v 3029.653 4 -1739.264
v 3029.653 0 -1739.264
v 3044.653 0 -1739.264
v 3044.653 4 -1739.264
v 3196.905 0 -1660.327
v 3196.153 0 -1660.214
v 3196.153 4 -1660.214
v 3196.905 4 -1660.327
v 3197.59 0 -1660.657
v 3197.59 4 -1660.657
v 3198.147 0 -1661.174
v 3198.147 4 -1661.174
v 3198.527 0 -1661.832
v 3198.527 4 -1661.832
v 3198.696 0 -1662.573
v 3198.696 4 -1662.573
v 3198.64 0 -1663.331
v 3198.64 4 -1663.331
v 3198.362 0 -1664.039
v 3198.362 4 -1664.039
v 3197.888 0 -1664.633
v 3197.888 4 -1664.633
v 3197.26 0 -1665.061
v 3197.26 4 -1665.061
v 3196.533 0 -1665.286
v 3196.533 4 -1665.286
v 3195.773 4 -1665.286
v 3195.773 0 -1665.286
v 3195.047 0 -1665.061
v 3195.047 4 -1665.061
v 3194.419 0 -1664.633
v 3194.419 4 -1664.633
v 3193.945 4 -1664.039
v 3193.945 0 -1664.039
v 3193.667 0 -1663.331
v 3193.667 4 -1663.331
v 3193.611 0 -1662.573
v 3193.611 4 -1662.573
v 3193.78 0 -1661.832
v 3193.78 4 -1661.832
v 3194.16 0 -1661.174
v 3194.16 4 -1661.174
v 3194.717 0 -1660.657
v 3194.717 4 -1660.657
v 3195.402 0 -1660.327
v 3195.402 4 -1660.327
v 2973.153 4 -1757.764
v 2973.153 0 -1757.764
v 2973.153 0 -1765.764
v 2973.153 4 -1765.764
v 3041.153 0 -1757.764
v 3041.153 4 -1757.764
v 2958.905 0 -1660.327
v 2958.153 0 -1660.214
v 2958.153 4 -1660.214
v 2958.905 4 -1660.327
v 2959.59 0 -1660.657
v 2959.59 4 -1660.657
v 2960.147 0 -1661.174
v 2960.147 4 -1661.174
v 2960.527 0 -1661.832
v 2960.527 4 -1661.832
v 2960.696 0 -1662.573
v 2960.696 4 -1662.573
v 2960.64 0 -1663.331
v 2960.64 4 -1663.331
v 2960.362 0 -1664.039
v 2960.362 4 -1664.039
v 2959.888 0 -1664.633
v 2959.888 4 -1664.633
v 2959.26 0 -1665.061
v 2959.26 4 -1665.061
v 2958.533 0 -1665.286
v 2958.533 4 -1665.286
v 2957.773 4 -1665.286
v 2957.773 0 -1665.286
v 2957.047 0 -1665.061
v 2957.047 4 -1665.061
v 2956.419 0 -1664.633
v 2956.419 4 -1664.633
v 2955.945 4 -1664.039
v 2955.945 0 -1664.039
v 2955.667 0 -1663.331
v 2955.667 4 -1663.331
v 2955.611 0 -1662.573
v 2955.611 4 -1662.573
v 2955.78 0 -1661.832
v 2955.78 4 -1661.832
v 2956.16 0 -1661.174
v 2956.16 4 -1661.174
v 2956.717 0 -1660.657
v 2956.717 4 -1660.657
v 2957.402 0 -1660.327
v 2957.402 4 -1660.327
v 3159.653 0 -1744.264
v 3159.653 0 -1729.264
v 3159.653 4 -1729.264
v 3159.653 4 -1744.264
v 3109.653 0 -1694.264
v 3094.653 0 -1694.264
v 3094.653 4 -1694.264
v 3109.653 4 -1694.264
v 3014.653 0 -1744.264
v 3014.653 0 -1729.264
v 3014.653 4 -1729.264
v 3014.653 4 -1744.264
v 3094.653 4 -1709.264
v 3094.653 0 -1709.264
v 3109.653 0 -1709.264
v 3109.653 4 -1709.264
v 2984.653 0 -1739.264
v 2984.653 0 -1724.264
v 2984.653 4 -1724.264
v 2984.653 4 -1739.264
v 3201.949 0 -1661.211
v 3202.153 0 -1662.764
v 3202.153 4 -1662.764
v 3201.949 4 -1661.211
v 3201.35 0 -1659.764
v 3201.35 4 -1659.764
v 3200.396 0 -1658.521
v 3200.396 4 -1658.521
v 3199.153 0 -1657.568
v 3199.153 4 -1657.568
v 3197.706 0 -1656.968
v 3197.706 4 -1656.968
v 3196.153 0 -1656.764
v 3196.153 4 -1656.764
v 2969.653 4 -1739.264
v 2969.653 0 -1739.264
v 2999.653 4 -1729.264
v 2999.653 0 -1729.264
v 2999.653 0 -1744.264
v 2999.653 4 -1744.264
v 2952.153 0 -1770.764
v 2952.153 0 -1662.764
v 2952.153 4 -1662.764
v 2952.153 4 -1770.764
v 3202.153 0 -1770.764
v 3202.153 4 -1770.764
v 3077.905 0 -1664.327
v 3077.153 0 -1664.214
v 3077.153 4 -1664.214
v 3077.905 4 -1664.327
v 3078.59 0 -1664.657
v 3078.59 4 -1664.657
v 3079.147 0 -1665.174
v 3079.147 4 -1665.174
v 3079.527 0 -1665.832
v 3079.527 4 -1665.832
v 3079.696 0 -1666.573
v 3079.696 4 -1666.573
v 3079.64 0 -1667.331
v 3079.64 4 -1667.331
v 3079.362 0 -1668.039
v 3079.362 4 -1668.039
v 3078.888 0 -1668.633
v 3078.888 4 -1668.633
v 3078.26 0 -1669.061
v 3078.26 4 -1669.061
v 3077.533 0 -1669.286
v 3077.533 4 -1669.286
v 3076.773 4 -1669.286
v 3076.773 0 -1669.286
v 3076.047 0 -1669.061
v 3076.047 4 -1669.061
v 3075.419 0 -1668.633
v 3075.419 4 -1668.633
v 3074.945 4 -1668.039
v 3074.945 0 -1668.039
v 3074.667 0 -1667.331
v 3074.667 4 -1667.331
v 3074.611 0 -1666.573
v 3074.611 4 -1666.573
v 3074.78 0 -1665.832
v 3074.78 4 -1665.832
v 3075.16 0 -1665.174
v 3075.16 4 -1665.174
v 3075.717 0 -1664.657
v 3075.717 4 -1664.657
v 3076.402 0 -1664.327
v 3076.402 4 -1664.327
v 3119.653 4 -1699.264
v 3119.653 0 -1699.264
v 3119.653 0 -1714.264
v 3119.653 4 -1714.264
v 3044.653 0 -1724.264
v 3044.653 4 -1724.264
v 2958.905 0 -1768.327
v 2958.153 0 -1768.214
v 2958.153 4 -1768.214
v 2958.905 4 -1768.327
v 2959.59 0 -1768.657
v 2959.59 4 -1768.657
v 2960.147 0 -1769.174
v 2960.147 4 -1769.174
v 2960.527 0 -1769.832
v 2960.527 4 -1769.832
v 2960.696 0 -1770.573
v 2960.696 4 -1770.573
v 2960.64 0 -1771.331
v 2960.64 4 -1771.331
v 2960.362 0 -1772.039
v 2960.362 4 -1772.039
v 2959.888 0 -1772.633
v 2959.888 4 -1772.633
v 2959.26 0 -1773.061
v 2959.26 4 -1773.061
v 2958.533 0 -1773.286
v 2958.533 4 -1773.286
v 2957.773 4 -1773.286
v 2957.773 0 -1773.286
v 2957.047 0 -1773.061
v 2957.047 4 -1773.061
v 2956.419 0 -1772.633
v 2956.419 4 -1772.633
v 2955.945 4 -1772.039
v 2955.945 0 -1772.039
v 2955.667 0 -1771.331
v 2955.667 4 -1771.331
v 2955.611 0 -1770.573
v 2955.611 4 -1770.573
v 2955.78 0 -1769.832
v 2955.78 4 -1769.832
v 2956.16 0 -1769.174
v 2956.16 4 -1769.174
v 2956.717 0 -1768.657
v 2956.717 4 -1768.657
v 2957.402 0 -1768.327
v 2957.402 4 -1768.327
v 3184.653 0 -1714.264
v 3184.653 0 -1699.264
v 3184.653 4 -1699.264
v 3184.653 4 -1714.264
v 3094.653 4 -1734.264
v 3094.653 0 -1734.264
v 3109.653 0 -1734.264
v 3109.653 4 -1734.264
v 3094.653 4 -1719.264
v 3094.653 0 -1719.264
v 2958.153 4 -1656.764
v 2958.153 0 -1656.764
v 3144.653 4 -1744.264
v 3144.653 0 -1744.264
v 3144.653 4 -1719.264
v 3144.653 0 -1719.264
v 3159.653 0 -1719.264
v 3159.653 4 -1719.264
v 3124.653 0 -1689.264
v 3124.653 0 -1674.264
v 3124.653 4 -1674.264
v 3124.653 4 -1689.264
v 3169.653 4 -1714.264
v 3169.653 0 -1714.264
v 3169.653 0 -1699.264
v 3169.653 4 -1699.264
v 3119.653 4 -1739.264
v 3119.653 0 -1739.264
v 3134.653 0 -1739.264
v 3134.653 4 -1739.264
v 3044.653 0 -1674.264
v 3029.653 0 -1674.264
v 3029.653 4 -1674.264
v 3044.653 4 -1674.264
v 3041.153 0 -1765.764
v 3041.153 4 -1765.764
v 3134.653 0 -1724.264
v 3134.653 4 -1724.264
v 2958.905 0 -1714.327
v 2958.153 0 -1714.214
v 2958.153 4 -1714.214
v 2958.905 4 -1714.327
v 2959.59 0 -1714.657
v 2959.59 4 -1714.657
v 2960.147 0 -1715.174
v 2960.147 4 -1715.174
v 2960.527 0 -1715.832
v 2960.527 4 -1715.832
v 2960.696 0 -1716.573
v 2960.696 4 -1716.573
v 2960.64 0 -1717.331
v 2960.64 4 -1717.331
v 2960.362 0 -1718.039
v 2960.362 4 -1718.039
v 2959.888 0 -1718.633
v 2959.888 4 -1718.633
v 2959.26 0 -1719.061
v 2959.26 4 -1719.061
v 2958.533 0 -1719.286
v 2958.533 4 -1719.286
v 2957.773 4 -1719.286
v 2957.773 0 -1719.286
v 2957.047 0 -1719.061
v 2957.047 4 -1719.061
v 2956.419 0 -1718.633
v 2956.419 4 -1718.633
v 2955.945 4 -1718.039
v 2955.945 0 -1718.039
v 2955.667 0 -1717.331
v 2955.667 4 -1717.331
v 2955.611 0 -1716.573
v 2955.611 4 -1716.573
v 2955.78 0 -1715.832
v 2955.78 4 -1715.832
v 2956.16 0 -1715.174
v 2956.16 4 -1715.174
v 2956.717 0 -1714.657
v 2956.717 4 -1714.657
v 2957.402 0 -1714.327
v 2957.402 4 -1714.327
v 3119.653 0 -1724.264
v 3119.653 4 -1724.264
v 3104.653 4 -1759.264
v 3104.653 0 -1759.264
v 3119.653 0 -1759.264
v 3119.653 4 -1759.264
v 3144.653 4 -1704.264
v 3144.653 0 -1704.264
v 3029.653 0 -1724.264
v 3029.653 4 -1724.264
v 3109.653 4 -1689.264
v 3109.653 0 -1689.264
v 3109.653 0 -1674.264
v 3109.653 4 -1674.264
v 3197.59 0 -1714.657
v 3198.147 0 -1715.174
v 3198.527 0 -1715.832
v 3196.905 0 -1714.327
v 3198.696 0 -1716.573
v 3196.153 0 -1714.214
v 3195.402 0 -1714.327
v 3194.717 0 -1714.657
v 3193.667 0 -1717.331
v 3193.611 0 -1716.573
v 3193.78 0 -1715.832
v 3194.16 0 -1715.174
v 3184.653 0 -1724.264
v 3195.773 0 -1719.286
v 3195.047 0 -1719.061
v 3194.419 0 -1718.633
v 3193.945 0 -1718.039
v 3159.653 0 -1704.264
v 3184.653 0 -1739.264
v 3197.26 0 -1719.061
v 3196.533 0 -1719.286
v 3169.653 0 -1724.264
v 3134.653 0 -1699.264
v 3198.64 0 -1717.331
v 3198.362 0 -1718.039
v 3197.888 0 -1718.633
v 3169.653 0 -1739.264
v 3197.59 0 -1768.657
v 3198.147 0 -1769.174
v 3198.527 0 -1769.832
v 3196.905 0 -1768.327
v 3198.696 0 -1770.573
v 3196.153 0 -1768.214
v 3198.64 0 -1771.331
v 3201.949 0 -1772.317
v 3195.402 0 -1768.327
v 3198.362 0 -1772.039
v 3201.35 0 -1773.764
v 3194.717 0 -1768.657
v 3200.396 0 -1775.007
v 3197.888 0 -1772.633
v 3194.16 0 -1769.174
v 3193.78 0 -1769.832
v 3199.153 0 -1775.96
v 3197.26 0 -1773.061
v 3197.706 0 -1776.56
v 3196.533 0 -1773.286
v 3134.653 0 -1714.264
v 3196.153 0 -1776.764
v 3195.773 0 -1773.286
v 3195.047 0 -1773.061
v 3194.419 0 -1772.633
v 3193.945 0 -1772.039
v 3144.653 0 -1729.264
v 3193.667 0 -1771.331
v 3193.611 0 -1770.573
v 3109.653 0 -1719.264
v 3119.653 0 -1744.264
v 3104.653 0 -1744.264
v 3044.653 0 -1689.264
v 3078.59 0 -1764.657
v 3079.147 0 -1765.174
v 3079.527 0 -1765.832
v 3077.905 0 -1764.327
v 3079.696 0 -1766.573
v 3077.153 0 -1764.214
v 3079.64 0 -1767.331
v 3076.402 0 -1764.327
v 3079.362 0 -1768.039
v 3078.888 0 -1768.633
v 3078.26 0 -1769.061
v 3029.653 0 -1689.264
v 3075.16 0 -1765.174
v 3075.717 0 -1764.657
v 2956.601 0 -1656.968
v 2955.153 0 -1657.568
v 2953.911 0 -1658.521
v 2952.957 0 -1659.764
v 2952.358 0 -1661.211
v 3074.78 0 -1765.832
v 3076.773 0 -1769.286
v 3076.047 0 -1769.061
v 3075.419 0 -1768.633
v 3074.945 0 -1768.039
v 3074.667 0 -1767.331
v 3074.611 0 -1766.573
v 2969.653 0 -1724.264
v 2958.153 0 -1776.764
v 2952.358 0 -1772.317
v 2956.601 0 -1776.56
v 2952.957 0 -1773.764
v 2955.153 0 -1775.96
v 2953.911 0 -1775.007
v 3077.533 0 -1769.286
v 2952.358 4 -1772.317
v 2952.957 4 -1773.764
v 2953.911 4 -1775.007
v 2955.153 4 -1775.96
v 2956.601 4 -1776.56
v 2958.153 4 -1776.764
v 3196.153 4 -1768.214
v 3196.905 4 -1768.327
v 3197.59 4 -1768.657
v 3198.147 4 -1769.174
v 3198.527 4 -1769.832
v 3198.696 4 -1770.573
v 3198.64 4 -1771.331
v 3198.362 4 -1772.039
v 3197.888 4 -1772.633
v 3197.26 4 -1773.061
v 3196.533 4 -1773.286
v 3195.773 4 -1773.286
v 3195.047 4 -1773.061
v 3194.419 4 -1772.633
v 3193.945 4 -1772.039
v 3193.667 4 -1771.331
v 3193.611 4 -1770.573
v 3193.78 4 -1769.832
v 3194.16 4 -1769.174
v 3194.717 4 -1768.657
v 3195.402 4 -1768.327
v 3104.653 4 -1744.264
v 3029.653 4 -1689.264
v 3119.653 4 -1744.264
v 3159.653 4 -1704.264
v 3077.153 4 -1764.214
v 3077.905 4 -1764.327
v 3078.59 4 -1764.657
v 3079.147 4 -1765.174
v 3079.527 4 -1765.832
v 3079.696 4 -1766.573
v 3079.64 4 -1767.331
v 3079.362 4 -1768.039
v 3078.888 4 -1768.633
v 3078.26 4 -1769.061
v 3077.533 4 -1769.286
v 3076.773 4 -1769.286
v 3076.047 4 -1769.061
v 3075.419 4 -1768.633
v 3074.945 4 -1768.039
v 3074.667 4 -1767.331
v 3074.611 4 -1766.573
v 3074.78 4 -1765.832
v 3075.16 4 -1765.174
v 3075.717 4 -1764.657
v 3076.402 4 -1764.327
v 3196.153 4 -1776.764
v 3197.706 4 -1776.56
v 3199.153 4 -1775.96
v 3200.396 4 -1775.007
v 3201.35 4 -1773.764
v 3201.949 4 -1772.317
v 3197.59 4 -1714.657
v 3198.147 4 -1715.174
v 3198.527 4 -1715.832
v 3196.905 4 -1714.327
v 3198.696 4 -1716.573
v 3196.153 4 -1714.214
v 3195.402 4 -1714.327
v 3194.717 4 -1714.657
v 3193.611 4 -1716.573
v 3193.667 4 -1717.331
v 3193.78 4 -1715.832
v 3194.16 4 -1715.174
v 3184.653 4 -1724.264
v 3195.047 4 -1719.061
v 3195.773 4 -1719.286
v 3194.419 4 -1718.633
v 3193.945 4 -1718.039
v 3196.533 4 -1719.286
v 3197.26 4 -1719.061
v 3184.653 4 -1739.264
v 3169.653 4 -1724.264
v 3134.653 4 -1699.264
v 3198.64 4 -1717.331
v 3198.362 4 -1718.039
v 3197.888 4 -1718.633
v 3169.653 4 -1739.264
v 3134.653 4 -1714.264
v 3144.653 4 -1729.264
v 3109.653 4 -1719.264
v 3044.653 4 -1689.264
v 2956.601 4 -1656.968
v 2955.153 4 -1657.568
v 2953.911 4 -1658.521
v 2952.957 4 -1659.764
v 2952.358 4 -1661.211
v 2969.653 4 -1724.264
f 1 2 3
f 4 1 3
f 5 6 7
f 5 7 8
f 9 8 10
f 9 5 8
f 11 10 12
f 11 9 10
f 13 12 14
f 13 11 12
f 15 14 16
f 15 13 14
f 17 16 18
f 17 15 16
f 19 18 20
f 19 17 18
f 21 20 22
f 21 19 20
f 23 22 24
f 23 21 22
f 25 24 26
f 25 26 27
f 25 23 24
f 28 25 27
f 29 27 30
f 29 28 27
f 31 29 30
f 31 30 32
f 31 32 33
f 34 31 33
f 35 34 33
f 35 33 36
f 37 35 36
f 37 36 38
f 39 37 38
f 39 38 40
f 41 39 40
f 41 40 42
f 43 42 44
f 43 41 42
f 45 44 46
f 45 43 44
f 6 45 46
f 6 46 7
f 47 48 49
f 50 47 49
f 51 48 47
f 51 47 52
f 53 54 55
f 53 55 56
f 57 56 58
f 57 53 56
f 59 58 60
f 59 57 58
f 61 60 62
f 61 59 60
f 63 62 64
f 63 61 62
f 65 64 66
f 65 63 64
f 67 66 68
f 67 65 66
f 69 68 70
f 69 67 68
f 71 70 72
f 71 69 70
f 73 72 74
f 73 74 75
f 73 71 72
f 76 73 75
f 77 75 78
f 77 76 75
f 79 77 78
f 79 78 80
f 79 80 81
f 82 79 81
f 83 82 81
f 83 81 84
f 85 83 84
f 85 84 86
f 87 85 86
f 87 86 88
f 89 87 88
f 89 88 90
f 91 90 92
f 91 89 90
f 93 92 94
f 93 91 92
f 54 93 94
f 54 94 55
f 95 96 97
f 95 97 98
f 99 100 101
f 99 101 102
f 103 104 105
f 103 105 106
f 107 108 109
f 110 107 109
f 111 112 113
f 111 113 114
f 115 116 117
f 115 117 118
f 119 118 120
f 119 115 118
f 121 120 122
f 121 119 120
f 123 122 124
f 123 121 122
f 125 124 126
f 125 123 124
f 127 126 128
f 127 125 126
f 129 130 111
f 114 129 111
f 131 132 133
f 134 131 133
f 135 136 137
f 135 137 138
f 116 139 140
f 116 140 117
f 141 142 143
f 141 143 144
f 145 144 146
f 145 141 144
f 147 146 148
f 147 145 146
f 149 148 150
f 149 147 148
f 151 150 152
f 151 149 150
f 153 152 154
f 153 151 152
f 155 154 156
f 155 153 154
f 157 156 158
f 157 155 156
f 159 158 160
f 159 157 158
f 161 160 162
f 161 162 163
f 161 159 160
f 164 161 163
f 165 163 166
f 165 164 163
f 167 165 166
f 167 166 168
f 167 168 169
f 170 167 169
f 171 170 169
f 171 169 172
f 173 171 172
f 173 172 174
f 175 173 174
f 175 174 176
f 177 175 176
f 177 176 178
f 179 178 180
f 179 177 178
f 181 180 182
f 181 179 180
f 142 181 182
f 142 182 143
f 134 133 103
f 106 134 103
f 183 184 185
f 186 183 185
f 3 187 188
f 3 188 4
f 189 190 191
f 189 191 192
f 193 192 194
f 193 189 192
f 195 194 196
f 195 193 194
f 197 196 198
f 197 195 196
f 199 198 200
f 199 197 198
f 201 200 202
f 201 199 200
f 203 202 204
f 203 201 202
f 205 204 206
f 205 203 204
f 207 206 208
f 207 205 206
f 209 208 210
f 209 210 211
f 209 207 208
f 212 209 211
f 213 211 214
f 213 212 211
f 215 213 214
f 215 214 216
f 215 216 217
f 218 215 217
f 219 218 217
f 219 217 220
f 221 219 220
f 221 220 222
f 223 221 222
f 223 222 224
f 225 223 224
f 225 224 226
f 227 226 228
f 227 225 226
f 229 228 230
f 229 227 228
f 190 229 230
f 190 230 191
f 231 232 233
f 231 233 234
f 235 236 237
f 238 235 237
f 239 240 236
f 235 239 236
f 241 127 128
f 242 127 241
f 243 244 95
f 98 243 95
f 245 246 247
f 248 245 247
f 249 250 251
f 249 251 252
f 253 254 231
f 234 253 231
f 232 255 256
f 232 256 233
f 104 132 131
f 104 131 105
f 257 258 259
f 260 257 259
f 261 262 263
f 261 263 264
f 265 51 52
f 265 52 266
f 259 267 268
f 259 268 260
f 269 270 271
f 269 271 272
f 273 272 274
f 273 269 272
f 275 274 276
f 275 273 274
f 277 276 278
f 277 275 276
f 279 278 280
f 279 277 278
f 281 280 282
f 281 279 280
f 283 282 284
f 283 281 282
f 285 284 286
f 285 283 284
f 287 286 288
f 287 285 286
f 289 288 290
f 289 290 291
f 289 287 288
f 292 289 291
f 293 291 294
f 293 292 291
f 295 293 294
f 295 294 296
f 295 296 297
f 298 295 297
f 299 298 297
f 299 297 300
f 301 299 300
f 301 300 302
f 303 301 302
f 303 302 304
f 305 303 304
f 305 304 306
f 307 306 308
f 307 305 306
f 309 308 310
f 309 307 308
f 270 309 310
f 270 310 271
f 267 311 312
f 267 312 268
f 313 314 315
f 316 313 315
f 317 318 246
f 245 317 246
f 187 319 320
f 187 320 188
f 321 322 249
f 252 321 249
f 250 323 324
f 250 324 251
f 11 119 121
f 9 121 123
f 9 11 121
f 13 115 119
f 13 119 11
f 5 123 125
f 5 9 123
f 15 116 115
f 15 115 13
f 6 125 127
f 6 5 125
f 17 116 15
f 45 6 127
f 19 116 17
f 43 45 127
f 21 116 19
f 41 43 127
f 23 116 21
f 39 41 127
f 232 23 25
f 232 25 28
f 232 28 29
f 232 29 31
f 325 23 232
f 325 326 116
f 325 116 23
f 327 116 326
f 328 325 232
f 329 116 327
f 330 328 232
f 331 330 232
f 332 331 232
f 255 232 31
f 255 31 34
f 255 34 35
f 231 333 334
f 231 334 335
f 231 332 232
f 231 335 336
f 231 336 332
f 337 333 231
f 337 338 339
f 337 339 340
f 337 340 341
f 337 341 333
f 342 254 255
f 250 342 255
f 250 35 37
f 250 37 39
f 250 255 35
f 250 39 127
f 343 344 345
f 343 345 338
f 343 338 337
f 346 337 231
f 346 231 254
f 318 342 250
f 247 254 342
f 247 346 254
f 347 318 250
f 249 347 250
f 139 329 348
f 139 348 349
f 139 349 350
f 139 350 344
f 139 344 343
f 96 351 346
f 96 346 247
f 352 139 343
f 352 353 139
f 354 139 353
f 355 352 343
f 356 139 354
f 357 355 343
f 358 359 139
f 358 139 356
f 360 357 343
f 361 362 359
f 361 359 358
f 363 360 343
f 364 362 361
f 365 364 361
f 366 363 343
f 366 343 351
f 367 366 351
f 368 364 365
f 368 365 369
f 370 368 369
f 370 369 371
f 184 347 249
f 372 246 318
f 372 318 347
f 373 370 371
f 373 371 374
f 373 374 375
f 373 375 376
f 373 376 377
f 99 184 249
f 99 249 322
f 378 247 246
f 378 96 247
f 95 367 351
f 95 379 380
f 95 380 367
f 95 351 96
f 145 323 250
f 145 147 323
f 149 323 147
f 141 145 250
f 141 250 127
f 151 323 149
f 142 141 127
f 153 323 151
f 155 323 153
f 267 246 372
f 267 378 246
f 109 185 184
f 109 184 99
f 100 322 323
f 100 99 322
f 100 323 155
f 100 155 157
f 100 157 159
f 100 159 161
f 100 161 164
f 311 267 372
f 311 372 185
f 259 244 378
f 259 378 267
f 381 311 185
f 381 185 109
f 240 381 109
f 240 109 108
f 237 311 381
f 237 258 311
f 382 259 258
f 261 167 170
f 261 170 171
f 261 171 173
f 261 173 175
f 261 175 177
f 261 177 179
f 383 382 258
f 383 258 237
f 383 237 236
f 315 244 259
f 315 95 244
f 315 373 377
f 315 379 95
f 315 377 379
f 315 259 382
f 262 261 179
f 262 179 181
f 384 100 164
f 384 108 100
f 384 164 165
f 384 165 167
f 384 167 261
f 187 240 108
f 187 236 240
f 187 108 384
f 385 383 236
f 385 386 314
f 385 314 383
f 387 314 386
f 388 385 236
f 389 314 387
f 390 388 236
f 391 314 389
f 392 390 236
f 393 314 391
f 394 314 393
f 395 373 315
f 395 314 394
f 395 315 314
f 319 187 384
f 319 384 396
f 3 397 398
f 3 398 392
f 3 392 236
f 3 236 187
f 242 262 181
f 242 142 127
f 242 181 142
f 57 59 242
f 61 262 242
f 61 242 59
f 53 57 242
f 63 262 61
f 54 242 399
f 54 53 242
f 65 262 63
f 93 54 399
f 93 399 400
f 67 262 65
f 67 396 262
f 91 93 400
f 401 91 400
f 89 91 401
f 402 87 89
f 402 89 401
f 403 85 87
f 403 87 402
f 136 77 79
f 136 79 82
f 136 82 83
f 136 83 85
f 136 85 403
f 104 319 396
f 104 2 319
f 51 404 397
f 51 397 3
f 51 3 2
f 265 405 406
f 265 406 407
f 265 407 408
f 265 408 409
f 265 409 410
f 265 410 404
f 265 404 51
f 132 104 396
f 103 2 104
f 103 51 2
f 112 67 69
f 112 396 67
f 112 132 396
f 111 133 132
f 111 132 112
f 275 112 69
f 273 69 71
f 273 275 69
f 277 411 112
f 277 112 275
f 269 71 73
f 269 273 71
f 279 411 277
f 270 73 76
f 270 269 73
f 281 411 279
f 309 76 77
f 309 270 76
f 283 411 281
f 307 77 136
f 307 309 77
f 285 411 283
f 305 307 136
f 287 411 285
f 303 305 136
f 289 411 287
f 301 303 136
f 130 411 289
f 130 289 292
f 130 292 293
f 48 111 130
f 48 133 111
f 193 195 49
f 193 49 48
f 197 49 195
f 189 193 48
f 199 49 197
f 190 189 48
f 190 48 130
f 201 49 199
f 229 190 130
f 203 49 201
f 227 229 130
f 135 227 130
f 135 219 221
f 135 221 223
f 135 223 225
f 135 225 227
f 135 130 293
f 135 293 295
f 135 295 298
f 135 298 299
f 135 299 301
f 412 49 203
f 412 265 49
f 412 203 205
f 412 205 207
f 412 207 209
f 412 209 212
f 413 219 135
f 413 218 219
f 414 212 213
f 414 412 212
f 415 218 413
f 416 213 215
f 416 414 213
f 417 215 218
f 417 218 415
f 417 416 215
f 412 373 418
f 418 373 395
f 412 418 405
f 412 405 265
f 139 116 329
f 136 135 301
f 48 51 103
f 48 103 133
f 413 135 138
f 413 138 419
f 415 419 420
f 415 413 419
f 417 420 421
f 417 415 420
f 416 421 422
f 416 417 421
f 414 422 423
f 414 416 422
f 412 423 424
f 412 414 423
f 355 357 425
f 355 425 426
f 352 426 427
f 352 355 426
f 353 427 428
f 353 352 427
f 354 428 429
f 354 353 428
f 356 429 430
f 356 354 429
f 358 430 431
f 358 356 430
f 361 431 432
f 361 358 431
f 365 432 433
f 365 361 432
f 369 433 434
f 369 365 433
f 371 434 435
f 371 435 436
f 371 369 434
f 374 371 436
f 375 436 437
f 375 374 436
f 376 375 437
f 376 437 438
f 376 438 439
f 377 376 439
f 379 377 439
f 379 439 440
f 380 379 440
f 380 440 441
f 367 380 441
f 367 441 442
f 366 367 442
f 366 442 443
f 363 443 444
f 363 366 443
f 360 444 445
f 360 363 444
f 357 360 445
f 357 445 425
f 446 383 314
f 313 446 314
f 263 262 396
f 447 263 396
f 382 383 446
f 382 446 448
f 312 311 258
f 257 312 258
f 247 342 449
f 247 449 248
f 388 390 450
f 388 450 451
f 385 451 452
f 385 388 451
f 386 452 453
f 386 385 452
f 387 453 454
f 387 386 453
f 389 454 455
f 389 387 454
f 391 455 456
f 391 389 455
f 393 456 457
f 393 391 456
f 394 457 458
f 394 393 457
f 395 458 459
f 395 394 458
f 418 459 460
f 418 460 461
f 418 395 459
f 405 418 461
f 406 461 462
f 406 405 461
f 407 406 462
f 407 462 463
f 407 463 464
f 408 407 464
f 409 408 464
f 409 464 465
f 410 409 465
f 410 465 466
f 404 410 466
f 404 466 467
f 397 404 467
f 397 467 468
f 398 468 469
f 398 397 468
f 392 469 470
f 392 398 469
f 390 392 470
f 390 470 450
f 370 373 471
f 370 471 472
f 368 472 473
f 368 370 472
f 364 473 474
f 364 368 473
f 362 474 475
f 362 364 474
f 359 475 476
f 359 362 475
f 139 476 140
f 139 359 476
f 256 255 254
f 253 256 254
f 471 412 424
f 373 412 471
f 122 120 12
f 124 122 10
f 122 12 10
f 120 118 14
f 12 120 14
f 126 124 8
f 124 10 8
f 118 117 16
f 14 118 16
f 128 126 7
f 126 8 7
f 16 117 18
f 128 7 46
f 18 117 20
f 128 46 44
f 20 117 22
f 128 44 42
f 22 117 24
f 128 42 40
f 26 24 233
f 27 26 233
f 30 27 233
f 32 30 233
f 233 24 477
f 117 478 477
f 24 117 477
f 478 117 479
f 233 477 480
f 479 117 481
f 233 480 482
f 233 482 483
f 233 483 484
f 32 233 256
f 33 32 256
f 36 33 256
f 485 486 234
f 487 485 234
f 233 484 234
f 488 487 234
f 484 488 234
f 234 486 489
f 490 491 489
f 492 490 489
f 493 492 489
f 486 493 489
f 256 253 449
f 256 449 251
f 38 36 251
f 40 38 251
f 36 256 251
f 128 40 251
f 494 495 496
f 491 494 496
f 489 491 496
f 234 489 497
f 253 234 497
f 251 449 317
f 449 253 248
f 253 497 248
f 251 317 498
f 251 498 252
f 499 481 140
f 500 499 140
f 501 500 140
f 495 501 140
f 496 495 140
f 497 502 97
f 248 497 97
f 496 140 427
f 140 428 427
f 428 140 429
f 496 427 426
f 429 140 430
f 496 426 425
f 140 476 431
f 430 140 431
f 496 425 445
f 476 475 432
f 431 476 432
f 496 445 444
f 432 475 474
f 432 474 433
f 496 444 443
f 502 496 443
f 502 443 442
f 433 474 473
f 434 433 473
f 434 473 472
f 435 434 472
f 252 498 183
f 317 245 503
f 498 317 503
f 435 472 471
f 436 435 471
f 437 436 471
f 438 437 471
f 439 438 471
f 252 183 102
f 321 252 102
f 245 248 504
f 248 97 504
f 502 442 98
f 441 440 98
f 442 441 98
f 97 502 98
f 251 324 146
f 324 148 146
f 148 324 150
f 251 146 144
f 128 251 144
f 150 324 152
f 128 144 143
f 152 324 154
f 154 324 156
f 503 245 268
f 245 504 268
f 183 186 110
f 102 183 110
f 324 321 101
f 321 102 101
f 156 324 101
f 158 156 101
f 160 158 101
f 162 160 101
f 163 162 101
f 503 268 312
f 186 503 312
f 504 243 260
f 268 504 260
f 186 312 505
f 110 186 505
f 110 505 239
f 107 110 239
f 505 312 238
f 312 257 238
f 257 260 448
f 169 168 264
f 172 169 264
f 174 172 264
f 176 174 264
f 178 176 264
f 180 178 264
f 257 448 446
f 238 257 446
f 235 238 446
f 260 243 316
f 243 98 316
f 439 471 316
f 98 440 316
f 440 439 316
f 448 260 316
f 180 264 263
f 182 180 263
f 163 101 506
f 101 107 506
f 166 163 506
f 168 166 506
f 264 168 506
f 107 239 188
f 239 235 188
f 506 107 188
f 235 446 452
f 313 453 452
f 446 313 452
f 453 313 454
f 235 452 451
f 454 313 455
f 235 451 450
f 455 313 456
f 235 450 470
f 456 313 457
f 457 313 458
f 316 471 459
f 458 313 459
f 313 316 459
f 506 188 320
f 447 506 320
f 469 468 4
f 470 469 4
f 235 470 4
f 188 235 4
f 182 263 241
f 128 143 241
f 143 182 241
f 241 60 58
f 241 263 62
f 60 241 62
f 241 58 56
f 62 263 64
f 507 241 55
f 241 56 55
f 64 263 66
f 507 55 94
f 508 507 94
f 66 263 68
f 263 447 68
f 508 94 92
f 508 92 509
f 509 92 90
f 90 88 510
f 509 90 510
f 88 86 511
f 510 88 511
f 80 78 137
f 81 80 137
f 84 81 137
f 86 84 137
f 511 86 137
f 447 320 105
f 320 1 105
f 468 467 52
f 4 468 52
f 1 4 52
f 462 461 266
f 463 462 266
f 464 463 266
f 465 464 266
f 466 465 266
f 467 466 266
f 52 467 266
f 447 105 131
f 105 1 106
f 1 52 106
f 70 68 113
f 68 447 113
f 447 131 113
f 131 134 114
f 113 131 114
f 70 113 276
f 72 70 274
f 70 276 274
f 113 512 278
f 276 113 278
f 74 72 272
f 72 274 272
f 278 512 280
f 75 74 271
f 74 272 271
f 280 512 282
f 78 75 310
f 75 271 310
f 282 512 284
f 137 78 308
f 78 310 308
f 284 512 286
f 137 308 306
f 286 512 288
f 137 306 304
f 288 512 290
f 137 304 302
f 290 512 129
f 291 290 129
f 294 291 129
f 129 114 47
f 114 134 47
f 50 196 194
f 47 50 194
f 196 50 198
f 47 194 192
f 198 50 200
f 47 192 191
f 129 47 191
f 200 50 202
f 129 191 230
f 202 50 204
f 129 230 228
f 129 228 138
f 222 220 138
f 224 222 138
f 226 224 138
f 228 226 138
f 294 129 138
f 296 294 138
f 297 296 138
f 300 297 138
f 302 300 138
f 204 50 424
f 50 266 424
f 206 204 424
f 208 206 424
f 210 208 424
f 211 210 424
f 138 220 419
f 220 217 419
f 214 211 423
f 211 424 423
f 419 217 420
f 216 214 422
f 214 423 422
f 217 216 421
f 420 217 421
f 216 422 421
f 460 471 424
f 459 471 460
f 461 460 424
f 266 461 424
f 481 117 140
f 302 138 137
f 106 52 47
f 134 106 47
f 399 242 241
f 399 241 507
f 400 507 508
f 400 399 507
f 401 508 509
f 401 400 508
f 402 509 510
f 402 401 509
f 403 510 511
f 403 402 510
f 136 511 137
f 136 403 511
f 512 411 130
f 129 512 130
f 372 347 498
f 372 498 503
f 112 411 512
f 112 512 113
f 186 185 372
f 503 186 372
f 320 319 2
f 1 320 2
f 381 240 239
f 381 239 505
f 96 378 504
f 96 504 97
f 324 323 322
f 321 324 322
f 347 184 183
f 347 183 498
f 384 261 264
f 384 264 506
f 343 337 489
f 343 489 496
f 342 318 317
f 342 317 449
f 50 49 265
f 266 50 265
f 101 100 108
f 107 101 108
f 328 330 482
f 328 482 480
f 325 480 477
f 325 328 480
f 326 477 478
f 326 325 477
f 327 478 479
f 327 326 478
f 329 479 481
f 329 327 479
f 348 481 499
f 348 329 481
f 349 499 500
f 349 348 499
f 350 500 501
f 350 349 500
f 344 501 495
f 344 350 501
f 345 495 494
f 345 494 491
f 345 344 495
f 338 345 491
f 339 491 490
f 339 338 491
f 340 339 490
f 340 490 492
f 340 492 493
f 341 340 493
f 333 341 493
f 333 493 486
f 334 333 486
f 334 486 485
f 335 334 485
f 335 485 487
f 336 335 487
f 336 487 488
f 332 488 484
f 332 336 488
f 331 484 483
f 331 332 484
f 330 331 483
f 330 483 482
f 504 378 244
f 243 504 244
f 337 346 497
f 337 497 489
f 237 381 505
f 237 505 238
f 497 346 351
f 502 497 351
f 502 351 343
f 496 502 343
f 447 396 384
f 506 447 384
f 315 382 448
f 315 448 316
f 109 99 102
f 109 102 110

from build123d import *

# Parameters (mm, degrees)
SKETCH_1_R      = 2.55
SKETCH_1_W      = 15
SKETCH_1_H      = 15
SKETCH_1_W_2    = 68
SKETCH_1_H_2    = 8
EXTRUDE_1_DEPTH = 4


with BuildPart() as part:
    # 草图1 → 凸台-拉伸1 (new body)
    with BuildSketch(Plane(origin=(0, 0, 0), x_dir=(1, 0, 0), z_dir=(0, 1, 0))):
        with BuildLine():
            Line((2958.153435269, 1776.763982112), (3196.153435269, 1776.763982112))
            ThreePointArc((3196.153435269, 1776.763982112), (3200.396075956, 1775.006622799), (3202.153435269, 1770.763982112))
            Line((3202.153435269, 1770.763982112), (3202.153435269, 1662.763982112))
            ThreePointArc((3202.153435269, 1662.763982112), (3200.396075956, 1658.521341424), (3196.153435269, 1656.763982112))
            Line((3196.153435269, 1656.763982112), (2958.153435269, 1656.763982112))
            ThreePointArc((2958.153435269, 1656.763982112), (2953.910794582, 1658.521341424), (2952.153435269, 1662.763982112))
            Line((2952.153435269, 1662.763982112), (2952.153435269, 1770.763982112))
            ThreePointArc((2952.153435269, 1770.763982112), (2953.910794582, 1775.006622799), (2958.153435269, 1776.763982112))
        make_face()
        with Locations(Location((2958.153435269, 1770.763982112, 0), (0, 0, 270))):
            Circle(SKETCH_1_R, mode=Mode.SUBTRACT)
        with Locations(Location((3196.153435269, 1770.763982112, 0), (0, 0, 270))):
            Circle(SKETCH_1_R, mode=Mode.SUBTRACT)
        with Locations(Location((3077.153435269, 1766.763982112, 0), (0, 0, 270))):
            Circle(SKETCH_1_R, mode=Mode.SUBTRACT)
        with Locations(Location((2958.153435269, 1662.763982112, 0), (0, 0, 270))):
            Circle(SKETCH_1_R, mode=Mode.SUBTRACT)
        with Locations(Location((3196.153435269, 1662.763982112, 0), (0, 0, 270))):
            Circle(SKETCH_1_R, mode=Mode.SUBTRACT)
        with Locations(Location((3077.153435269, 1666.763982112, 0), (0, 0, 270))):
            Circle(SKETCH_1_R, mode=Mode.SUBTRACT)
        with Locations(Location((3196.153435269, 1716.763982112, 0), (0, 0, 270))):
            Circle(SKETCH_1_R, mode=Mode.SUBTRACT)
        with Locations(Location((2958.153435269, 1716.763982112, 0), (0, 0, 270))):
            Circle(SKETCH_1_R, mode=Mode.SUBTRACT)
        with Locations((2977.153435269, 1731.763982112)):
            Rectangle(SKETCH_1_W, SKETCH_1_H, mode=Mode.SUBTRACT)
        with Locations((3007.153435269, 1736.763982112)):
            Rectangle(SKETCH_1_W, SKETCH_1_H, mode=Mode.SUBTRACT)
        with Locations((3102.153435269, 1726.763982112)):
            Rectangle(SKETCH_1_W, SKETCH_1_H, mode=Mode.SUBTRACT)
        with Locations((3037.153435269, 1681.763982112)):
            Rectangle(SKETCH_1_W, SKETCH_1_H, mode=Mode.SUBTRACT)
        with Locations((3037.153435269, 1731.763982112)):
            Rectangle(SKETCH_1_W, SKETCH_1_H, mode=Mode.SUBTRACT)
        with Locations((3112.153435269, 1751.763982112)):
            Rectangle(SKETCH_1_W, SKETCH_1_H, mode=Mode.SUBTRACT)
        with Locations((3127.153435269, 1731.763982112)):
            Rectangle(SKETCH_1_W, SKETCH_1_H, mode=Mode.SUBTRACT)
        with Locations((3152.153435269, 1736.763982112)):
            Rectangle(SKETCH_1_W, SKETCH_1_H, mode=Mode.SUBTRACT)
        with Locations((3127.153435269, 1706.763982112)):
            Rectangle(SKETCH_1_W, SKETCH_1_H, mode=Mode.SUBTRACT)
        with Locations((3177.153435269, 1706.763982112)):
            Rectangle(SKETCH_1_W, SKETCH_1_H, mode=Mode.SUBTRACT)
        with Locations((3152.153435269, 1711.763982112)):
            Rectangle(SKETCH_1_W, SKETCH_1_H, mode=Mode.SUBTRACT)
        with Locations((3102.153435269, 1701.763982112)):
            Rectangle(SKETCH_1_W, SKETCH_1_H, mode=Mode.SUBTRACT)
        with Locations((3117.153435269, 1681.763982112)):
            Rectangle(SKETCH_1_W, SKETCH_1_H, mode=Mode.SUBTRACT)
        with Locations((3177.153435269, 1731.763982112)):
            Rectangle(SKETCH_1_W, SKETCH_1_H, mode=Mode.SUBTRACT)
        with Locations((3007.153435269, 1761.763982112)):
            Rectangle(SKETCH_1_W_2, SKETCH_1_H_2, mode=Mode.SUBTRACT)
    extrude(amount=EXTRUDE_1_DEPTH)


solid = part.part
